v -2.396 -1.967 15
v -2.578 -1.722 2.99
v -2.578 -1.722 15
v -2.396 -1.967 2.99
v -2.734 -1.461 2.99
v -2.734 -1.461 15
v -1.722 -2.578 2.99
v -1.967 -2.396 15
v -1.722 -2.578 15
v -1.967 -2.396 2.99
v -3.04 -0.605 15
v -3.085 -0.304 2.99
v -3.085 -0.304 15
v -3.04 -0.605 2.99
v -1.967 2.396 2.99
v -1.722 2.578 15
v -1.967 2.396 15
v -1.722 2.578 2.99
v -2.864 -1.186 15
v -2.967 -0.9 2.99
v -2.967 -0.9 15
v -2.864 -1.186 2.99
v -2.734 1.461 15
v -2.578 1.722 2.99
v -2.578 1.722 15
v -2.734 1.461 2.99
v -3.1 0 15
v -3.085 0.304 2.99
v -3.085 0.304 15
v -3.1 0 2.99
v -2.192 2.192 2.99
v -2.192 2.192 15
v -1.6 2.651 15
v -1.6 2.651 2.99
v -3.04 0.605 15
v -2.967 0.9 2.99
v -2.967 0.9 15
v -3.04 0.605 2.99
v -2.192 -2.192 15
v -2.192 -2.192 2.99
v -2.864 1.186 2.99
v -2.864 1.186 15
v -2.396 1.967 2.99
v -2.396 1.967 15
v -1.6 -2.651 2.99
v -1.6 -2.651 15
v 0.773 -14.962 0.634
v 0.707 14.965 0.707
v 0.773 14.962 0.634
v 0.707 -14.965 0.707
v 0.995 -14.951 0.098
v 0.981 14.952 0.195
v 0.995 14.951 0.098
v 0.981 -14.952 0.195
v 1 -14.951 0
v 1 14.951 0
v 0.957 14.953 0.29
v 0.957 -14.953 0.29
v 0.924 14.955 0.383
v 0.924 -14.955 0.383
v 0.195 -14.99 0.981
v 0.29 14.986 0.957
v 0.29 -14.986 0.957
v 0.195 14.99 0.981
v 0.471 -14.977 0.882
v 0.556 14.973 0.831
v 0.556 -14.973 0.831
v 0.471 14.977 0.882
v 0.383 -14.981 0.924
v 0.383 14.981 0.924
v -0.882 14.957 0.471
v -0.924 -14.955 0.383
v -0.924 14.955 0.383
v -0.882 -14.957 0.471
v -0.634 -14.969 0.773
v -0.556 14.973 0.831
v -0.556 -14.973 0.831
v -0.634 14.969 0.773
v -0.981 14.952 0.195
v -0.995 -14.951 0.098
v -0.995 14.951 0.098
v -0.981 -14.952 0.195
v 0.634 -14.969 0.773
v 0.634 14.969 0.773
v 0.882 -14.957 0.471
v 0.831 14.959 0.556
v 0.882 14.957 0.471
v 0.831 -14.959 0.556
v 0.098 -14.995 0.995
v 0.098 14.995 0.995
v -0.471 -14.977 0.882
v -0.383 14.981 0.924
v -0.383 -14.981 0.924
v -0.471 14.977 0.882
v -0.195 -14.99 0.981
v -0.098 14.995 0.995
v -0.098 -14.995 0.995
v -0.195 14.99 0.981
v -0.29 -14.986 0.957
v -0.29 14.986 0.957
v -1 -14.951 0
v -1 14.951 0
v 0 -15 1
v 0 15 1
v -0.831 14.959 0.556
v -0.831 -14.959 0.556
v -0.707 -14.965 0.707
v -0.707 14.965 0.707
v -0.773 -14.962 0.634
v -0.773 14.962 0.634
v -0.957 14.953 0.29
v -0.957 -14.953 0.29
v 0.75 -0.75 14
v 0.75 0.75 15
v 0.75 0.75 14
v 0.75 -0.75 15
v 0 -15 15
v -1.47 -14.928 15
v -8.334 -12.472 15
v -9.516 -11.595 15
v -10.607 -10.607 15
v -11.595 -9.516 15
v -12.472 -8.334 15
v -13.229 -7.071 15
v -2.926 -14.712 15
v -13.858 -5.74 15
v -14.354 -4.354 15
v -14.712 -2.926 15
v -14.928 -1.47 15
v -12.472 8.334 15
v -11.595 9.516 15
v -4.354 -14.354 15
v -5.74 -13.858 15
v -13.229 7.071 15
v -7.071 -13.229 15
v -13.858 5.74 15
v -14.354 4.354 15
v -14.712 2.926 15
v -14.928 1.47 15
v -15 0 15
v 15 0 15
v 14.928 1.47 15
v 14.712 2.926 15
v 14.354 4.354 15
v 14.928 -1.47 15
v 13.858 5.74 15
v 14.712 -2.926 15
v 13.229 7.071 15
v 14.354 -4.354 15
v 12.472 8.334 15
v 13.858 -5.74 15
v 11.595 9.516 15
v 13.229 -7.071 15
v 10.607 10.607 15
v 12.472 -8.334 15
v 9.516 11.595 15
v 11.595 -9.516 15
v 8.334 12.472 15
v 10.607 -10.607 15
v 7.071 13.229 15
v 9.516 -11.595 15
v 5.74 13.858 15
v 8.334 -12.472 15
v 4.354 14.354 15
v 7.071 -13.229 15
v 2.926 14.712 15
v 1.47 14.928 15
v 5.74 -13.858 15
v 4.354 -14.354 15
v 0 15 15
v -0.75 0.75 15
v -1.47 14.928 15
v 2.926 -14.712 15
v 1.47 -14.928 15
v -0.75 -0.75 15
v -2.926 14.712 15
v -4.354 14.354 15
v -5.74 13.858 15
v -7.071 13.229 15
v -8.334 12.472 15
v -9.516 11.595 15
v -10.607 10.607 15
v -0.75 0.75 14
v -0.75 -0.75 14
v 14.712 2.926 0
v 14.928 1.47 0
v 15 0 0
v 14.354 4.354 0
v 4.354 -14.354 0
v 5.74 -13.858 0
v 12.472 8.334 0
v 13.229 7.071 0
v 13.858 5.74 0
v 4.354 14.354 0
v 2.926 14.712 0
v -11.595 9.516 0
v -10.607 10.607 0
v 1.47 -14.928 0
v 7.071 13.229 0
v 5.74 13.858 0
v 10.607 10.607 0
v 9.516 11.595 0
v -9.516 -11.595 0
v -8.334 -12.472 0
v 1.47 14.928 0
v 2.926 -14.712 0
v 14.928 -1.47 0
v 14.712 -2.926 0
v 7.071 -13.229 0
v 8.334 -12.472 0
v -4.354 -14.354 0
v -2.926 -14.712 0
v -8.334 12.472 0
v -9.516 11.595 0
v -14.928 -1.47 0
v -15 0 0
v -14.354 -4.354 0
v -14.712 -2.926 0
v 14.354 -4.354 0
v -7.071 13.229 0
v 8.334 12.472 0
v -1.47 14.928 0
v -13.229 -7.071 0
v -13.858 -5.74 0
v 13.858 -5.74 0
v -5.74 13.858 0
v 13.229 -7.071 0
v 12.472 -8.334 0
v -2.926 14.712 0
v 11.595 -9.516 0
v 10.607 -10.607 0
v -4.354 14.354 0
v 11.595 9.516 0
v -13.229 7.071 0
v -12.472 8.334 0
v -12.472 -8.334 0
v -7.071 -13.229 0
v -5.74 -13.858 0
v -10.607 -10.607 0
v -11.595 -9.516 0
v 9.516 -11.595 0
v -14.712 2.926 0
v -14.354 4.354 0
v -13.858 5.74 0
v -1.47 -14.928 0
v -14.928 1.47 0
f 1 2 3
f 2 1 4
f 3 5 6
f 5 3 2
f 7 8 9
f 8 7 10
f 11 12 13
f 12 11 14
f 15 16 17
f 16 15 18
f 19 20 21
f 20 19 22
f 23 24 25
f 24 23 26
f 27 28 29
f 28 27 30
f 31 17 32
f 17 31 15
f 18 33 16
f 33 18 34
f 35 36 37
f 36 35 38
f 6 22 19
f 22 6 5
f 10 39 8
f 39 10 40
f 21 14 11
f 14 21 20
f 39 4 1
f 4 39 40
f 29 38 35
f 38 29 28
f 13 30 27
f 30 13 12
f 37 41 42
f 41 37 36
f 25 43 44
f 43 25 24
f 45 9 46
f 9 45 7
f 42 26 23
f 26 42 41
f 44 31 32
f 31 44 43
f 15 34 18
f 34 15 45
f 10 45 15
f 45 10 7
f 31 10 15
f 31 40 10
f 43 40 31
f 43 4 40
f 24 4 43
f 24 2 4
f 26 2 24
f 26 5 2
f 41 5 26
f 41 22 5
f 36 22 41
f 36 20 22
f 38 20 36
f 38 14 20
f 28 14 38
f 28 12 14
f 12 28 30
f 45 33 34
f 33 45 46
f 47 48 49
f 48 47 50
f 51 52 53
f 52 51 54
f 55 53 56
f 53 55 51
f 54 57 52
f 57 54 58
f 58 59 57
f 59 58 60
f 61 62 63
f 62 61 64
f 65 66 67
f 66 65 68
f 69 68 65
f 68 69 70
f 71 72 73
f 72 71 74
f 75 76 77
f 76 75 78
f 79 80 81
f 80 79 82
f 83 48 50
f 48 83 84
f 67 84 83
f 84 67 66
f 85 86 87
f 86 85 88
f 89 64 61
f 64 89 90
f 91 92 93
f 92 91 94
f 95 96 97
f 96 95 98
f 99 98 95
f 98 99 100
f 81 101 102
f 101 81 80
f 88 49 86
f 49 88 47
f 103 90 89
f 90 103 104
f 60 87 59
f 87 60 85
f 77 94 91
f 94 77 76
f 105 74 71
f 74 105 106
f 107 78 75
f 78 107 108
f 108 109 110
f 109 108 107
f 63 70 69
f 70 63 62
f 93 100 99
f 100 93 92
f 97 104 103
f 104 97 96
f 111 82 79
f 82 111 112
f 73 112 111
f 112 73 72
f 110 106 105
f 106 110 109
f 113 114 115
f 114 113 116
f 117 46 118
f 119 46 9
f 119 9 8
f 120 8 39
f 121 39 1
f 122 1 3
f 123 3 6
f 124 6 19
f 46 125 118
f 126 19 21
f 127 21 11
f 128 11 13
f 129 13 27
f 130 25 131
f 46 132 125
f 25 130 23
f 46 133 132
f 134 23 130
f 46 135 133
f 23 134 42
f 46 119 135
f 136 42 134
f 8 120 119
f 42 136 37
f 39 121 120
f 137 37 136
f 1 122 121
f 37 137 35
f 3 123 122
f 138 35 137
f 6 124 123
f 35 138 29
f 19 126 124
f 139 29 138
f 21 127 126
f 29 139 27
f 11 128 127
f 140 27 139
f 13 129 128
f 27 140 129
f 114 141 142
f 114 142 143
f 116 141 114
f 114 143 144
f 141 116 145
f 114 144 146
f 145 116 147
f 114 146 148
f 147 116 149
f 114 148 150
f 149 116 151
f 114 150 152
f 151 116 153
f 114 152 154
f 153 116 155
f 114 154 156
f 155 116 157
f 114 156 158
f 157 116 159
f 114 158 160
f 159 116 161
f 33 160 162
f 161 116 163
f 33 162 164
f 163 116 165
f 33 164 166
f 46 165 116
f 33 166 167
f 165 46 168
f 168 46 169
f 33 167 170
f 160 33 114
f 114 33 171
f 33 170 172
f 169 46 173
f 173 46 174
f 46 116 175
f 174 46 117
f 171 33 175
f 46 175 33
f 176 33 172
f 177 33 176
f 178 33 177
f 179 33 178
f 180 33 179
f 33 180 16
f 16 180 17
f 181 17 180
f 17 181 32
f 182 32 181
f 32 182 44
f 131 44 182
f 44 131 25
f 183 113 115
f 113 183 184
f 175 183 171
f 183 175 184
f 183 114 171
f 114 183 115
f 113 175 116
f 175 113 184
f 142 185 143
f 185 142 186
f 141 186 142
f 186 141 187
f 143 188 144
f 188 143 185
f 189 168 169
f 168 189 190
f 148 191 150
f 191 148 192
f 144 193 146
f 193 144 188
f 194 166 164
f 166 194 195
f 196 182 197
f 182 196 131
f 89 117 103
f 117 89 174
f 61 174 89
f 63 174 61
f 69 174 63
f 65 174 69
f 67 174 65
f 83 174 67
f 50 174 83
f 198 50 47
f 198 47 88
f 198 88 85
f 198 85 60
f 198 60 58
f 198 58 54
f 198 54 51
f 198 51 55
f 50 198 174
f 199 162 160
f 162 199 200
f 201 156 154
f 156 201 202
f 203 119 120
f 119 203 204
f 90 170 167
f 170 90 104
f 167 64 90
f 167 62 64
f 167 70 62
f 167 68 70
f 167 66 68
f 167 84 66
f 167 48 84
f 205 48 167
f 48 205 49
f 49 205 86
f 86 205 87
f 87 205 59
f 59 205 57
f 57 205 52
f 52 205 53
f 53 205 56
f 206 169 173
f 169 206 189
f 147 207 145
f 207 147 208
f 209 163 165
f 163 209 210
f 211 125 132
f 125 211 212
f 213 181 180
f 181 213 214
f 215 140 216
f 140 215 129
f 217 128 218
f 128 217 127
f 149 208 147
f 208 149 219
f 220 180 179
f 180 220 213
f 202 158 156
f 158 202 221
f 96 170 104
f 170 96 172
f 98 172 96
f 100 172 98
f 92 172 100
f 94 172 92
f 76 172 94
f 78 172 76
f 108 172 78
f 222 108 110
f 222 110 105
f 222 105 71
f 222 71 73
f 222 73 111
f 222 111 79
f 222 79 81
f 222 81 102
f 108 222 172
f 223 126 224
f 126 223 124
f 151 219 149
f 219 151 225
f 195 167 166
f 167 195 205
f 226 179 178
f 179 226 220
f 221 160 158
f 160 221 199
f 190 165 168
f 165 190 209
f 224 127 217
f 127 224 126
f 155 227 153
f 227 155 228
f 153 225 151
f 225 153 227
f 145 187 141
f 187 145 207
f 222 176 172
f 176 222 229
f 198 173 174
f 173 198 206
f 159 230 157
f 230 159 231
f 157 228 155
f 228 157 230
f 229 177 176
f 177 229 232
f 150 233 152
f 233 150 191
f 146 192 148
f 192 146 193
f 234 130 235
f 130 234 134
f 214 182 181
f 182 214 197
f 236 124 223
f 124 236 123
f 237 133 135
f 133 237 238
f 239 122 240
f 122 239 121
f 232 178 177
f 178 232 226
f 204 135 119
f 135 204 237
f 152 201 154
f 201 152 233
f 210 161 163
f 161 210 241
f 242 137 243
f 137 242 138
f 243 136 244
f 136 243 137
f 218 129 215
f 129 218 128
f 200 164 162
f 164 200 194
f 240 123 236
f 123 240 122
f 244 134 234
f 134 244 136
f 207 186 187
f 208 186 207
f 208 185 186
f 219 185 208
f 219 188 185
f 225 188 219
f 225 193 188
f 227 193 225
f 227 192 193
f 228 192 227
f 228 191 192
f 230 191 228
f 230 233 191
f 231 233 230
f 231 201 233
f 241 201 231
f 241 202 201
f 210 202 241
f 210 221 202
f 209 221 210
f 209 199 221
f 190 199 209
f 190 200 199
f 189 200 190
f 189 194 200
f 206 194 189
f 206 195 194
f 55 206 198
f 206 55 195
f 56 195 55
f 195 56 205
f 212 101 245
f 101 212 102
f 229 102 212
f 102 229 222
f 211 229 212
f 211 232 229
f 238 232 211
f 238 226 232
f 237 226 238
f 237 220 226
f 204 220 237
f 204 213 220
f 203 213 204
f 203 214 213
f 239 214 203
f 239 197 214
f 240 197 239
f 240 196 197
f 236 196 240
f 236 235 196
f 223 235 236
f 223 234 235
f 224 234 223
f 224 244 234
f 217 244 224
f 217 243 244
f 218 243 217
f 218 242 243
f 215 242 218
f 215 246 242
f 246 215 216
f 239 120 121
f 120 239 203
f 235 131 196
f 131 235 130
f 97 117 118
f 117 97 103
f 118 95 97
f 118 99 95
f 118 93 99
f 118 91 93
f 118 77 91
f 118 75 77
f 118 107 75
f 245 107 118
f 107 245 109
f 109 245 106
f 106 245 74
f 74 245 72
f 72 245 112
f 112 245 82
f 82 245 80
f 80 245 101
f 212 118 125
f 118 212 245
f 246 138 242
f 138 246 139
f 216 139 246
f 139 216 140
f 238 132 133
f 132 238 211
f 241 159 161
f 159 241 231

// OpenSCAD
// Built by bench/smallmodels/features/compiler.py from a list of features.
$fn = 64;
difference() {
  union() {
    translate([0, 0, 0]) cylinder(d = 30, h = 15);
  }
  union() {
    translate([0, 0, 2.99]) rotate([0, 0, 0]) difference() { cylinder(d = 6.2, h = 12.02); translate([-1.6, -6.2, -1]) cube([6.2, 12.4, 14.02]); }
    translate([0, 0, 0]) rotate([0, 0, 0]) rotate([90, 0, 0]) cylinder(d = 2, h = 1060, center = true);
    translate([0, 0, 0]) rotate([0, 0, 0]) rotate([90, 0, 0]) cylinder(d = 2, h = 1060, center = true);
    translate([0, 0, 0]) rotate([0, 0, 0]) rotate([90, 0, 0]) cylinder(d = 2, h = 1060, center = true);
    translate([0, 0, 0]) rotate([0, 0, 0]) rotate([90, 0, 0]) cylinder(d = 2, h = 1060, center = true);
    translate([0, 0, 0]) rotate([0, 0, 0]) rotate([90, 0, 0]) cylinder(d = 2, h = 1060, center = true);
    translate([0, 0, 0]) rotate([0, 0, 0]) rotate([90, 0, 0]) cylinder(d = 2, h = 1060, center = true);
    translate([0, 0, 0]) rotate([0, 0, 0]) rotate([90, 0, 0]) cylinder(d = 2, h = 1060, center = true);
    translate([0, 0, 0]) rotate([0, 0, 0]) rotate([90, 0, 0]) cylinder(d = 2, h = 1060, center = true);
    translate([0, 0, 0]) rotate([0, 0, 0]) rotate([90, 0, 0]) cylinder(d = 2, h = 1060, center = true);
    translate([0, 0, 0]) rotate([0, 0, 0]) rotate([90, 0, 0]) cylinder(d = 2, h = 1060, center = true);
    translate([0, 0, 0]) rotate([0, 0, 0]) rotate([90, 0, 0]) cylinder(d = 2, h = 1060, center = true);
    translate([0, 0, 0]) rotate([0, 0, 0]) rotate([90, 0, 0]) cylinder(d = 2, h = 1060, center = true);
    translate([0, 0, 0]) rotate([0, 0, 0]) rotate([90, 0, 0]) cylinder(d = 2, h = 1060, center = true);
    translate([0, 0, 0]) rotate([0, 0, 0]) rotate([90, 0, 0]) cylinder(d = 2, h = 1060, center = true);
    translate([0, 0, 0]) rotate([0, 0, 0]) rotate([90, 0, 0]) cylinder(d = 2, h = 1060, center = true);
    translate([0, 0, 0]) rotate([0, 0, 0]) rotate([90, 0, 0]) cylinder(d = 2, h = 1060, center = true);
    translate([0, 0, 14]) rotate([0, 0, 0]) translate([-0.75, -0.75, 0]) cube([1.5, 1.5, 1]);
  }
}
